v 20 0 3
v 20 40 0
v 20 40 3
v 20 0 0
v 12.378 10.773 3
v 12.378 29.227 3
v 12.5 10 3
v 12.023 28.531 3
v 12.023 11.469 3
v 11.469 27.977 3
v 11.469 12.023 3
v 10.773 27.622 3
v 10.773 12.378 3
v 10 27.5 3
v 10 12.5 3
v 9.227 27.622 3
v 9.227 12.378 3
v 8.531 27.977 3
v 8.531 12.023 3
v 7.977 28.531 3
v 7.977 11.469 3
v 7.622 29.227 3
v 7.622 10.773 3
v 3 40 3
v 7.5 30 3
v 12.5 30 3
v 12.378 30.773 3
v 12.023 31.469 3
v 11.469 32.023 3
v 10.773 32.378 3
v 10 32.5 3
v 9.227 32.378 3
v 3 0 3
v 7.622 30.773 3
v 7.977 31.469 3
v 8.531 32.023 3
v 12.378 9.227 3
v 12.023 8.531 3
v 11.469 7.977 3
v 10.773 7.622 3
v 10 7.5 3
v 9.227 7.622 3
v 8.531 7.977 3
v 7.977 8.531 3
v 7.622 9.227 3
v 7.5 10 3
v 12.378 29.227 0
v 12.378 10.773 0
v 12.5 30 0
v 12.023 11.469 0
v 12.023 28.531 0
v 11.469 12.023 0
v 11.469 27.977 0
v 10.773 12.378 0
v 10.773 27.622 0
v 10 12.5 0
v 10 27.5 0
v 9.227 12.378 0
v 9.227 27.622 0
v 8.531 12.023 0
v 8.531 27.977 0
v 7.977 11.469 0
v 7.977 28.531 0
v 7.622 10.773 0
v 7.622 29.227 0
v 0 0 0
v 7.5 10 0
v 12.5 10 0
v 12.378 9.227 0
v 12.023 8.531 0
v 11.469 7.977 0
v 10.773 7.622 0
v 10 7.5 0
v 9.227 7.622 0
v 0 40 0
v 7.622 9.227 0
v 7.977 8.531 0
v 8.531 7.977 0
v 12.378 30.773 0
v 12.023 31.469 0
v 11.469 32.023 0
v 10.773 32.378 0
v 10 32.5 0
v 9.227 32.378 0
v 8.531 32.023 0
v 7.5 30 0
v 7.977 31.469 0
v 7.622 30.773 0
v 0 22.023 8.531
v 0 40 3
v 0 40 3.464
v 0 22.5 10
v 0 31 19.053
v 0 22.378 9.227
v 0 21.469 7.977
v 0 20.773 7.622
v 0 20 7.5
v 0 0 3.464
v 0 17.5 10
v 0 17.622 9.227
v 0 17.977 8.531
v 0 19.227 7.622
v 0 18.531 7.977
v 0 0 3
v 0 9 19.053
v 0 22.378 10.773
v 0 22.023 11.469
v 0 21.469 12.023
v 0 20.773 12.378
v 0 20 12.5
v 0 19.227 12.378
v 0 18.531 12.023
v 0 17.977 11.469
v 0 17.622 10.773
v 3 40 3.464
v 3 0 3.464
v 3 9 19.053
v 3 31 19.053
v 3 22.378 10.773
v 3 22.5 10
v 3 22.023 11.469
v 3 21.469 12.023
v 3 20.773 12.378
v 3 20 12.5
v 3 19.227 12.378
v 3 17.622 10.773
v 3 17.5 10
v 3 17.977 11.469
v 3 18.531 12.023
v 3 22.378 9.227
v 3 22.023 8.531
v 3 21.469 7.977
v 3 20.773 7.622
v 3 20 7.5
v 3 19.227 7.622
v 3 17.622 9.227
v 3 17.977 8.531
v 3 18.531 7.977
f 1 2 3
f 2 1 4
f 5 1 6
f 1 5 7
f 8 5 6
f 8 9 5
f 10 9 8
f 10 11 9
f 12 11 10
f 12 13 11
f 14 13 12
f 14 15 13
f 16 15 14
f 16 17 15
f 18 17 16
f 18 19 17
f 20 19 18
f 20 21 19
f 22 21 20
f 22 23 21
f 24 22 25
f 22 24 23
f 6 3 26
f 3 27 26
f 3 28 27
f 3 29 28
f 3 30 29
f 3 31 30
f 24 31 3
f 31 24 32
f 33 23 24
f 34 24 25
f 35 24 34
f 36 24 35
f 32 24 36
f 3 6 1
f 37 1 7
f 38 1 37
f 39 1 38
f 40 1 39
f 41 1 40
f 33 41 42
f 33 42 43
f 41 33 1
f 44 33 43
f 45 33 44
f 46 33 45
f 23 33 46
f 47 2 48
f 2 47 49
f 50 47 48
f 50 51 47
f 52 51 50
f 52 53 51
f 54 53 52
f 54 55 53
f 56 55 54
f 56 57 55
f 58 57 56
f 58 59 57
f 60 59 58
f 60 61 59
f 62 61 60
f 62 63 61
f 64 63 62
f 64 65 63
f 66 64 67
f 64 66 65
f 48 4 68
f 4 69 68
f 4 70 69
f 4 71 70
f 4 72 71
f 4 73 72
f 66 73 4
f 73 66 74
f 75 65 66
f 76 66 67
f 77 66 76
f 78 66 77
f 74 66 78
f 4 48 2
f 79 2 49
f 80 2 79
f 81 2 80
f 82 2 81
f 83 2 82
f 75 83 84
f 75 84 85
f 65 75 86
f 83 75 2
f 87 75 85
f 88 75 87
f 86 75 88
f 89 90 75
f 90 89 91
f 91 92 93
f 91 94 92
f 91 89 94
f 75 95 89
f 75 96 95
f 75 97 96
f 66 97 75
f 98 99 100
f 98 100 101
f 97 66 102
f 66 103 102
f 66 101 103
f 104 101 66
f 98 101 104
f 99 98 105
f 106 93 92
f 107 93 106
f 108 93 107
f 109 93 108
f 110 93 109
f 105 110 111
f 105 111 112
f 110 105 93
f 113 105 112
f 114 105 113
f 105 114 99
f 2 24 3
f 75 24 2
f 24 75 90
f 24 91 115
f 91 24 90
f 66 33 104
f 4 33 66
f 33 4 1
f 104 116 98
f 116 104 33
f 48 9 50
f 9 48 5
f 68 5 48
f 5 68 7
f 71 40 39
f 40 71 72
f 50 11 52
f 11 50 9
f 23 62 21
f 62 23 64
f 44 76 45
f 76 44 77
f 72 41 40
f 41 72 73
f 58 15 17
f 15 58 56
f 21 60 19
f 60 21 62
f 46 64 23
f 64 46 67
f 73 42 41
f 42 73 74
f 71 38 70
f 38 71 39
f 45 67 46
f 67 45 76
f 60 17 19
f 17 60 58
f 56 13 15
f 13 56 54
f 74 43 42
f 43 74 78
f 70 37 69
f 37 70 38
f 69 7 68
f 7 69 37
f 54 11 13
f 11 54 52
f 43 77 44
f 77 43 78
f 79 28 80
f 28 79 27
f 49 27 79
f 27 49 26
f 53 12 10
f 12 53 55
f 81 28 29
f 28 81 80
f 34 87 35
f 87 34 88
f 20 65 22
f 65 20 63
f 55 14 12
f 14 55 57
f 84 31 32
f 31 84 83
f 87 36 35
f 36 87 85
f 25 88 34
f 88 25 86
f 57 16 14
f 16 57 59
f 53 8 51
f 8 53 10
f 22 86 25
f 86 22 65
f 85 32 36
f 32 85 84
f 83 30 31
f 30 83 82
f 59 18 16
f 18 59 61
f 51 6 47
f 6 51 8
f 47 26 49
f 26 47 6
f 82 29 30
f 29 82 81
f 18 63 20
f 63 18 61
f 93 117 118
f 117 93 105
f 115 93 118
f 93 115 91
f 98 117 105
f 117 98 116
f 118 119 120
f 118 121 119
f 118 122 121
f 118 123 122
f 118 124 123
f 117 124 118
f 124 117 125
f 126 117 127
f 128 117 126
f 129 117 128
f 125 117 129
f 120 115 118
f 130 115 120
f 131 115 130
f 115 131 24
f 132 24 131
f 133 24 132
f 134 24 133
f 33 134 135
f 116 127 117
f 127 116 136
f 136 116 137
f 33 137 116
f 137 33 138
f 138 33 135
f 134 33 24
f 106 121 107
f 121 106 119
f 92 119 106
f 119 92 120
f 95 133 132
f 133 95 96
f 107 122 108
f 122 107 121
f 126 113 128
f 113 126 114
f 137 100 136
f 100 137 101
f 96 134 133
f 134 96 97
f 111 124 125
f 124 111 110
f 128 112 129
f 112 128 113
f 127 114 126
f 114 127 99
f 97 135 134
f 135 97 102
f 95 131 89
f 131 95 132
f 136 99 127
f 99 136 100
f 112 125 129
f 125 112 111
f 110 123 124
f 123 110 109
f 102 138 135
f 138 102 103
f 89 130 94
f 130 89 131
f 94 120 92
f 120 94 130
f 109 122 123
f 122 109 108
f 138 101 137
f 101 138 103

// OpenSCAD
// Eduardo Blanco Bielsa - UO285176
module base(anchoc,largoc, altoc, alturaAgujero,diamAgujero, offset){
    union(){
            difference(){
                cube([anchoc,largoc,altoc]);
                translate([10,10,0])
                    cylinder(h= alturaAgujero, d = diamAgujero, $fn=offset);
                translate([10,30,0])
                    cylinder(h= alturaAgujero, d = diamAgujero, $fn=offset);
            } 
           difference(){ 
                rotate([90,0,90])
                    translate([20,0,0])
                        cylinder(h = alturaAgujero, r=22, $fn=6);
                
               translate([-30,-5,-50])
                    cube (50);
               translate([0,-5,0])
                    cube (5);
               translate([0,40,0])
                    cube (5);
               rotate([90,0,90])
                    translate([20,10,0])
                        cylinder(h= alturaAgujero, d = diamAgujero, $fn=offset);
           }
    }
}
base(20,40,3,3,5,20);
